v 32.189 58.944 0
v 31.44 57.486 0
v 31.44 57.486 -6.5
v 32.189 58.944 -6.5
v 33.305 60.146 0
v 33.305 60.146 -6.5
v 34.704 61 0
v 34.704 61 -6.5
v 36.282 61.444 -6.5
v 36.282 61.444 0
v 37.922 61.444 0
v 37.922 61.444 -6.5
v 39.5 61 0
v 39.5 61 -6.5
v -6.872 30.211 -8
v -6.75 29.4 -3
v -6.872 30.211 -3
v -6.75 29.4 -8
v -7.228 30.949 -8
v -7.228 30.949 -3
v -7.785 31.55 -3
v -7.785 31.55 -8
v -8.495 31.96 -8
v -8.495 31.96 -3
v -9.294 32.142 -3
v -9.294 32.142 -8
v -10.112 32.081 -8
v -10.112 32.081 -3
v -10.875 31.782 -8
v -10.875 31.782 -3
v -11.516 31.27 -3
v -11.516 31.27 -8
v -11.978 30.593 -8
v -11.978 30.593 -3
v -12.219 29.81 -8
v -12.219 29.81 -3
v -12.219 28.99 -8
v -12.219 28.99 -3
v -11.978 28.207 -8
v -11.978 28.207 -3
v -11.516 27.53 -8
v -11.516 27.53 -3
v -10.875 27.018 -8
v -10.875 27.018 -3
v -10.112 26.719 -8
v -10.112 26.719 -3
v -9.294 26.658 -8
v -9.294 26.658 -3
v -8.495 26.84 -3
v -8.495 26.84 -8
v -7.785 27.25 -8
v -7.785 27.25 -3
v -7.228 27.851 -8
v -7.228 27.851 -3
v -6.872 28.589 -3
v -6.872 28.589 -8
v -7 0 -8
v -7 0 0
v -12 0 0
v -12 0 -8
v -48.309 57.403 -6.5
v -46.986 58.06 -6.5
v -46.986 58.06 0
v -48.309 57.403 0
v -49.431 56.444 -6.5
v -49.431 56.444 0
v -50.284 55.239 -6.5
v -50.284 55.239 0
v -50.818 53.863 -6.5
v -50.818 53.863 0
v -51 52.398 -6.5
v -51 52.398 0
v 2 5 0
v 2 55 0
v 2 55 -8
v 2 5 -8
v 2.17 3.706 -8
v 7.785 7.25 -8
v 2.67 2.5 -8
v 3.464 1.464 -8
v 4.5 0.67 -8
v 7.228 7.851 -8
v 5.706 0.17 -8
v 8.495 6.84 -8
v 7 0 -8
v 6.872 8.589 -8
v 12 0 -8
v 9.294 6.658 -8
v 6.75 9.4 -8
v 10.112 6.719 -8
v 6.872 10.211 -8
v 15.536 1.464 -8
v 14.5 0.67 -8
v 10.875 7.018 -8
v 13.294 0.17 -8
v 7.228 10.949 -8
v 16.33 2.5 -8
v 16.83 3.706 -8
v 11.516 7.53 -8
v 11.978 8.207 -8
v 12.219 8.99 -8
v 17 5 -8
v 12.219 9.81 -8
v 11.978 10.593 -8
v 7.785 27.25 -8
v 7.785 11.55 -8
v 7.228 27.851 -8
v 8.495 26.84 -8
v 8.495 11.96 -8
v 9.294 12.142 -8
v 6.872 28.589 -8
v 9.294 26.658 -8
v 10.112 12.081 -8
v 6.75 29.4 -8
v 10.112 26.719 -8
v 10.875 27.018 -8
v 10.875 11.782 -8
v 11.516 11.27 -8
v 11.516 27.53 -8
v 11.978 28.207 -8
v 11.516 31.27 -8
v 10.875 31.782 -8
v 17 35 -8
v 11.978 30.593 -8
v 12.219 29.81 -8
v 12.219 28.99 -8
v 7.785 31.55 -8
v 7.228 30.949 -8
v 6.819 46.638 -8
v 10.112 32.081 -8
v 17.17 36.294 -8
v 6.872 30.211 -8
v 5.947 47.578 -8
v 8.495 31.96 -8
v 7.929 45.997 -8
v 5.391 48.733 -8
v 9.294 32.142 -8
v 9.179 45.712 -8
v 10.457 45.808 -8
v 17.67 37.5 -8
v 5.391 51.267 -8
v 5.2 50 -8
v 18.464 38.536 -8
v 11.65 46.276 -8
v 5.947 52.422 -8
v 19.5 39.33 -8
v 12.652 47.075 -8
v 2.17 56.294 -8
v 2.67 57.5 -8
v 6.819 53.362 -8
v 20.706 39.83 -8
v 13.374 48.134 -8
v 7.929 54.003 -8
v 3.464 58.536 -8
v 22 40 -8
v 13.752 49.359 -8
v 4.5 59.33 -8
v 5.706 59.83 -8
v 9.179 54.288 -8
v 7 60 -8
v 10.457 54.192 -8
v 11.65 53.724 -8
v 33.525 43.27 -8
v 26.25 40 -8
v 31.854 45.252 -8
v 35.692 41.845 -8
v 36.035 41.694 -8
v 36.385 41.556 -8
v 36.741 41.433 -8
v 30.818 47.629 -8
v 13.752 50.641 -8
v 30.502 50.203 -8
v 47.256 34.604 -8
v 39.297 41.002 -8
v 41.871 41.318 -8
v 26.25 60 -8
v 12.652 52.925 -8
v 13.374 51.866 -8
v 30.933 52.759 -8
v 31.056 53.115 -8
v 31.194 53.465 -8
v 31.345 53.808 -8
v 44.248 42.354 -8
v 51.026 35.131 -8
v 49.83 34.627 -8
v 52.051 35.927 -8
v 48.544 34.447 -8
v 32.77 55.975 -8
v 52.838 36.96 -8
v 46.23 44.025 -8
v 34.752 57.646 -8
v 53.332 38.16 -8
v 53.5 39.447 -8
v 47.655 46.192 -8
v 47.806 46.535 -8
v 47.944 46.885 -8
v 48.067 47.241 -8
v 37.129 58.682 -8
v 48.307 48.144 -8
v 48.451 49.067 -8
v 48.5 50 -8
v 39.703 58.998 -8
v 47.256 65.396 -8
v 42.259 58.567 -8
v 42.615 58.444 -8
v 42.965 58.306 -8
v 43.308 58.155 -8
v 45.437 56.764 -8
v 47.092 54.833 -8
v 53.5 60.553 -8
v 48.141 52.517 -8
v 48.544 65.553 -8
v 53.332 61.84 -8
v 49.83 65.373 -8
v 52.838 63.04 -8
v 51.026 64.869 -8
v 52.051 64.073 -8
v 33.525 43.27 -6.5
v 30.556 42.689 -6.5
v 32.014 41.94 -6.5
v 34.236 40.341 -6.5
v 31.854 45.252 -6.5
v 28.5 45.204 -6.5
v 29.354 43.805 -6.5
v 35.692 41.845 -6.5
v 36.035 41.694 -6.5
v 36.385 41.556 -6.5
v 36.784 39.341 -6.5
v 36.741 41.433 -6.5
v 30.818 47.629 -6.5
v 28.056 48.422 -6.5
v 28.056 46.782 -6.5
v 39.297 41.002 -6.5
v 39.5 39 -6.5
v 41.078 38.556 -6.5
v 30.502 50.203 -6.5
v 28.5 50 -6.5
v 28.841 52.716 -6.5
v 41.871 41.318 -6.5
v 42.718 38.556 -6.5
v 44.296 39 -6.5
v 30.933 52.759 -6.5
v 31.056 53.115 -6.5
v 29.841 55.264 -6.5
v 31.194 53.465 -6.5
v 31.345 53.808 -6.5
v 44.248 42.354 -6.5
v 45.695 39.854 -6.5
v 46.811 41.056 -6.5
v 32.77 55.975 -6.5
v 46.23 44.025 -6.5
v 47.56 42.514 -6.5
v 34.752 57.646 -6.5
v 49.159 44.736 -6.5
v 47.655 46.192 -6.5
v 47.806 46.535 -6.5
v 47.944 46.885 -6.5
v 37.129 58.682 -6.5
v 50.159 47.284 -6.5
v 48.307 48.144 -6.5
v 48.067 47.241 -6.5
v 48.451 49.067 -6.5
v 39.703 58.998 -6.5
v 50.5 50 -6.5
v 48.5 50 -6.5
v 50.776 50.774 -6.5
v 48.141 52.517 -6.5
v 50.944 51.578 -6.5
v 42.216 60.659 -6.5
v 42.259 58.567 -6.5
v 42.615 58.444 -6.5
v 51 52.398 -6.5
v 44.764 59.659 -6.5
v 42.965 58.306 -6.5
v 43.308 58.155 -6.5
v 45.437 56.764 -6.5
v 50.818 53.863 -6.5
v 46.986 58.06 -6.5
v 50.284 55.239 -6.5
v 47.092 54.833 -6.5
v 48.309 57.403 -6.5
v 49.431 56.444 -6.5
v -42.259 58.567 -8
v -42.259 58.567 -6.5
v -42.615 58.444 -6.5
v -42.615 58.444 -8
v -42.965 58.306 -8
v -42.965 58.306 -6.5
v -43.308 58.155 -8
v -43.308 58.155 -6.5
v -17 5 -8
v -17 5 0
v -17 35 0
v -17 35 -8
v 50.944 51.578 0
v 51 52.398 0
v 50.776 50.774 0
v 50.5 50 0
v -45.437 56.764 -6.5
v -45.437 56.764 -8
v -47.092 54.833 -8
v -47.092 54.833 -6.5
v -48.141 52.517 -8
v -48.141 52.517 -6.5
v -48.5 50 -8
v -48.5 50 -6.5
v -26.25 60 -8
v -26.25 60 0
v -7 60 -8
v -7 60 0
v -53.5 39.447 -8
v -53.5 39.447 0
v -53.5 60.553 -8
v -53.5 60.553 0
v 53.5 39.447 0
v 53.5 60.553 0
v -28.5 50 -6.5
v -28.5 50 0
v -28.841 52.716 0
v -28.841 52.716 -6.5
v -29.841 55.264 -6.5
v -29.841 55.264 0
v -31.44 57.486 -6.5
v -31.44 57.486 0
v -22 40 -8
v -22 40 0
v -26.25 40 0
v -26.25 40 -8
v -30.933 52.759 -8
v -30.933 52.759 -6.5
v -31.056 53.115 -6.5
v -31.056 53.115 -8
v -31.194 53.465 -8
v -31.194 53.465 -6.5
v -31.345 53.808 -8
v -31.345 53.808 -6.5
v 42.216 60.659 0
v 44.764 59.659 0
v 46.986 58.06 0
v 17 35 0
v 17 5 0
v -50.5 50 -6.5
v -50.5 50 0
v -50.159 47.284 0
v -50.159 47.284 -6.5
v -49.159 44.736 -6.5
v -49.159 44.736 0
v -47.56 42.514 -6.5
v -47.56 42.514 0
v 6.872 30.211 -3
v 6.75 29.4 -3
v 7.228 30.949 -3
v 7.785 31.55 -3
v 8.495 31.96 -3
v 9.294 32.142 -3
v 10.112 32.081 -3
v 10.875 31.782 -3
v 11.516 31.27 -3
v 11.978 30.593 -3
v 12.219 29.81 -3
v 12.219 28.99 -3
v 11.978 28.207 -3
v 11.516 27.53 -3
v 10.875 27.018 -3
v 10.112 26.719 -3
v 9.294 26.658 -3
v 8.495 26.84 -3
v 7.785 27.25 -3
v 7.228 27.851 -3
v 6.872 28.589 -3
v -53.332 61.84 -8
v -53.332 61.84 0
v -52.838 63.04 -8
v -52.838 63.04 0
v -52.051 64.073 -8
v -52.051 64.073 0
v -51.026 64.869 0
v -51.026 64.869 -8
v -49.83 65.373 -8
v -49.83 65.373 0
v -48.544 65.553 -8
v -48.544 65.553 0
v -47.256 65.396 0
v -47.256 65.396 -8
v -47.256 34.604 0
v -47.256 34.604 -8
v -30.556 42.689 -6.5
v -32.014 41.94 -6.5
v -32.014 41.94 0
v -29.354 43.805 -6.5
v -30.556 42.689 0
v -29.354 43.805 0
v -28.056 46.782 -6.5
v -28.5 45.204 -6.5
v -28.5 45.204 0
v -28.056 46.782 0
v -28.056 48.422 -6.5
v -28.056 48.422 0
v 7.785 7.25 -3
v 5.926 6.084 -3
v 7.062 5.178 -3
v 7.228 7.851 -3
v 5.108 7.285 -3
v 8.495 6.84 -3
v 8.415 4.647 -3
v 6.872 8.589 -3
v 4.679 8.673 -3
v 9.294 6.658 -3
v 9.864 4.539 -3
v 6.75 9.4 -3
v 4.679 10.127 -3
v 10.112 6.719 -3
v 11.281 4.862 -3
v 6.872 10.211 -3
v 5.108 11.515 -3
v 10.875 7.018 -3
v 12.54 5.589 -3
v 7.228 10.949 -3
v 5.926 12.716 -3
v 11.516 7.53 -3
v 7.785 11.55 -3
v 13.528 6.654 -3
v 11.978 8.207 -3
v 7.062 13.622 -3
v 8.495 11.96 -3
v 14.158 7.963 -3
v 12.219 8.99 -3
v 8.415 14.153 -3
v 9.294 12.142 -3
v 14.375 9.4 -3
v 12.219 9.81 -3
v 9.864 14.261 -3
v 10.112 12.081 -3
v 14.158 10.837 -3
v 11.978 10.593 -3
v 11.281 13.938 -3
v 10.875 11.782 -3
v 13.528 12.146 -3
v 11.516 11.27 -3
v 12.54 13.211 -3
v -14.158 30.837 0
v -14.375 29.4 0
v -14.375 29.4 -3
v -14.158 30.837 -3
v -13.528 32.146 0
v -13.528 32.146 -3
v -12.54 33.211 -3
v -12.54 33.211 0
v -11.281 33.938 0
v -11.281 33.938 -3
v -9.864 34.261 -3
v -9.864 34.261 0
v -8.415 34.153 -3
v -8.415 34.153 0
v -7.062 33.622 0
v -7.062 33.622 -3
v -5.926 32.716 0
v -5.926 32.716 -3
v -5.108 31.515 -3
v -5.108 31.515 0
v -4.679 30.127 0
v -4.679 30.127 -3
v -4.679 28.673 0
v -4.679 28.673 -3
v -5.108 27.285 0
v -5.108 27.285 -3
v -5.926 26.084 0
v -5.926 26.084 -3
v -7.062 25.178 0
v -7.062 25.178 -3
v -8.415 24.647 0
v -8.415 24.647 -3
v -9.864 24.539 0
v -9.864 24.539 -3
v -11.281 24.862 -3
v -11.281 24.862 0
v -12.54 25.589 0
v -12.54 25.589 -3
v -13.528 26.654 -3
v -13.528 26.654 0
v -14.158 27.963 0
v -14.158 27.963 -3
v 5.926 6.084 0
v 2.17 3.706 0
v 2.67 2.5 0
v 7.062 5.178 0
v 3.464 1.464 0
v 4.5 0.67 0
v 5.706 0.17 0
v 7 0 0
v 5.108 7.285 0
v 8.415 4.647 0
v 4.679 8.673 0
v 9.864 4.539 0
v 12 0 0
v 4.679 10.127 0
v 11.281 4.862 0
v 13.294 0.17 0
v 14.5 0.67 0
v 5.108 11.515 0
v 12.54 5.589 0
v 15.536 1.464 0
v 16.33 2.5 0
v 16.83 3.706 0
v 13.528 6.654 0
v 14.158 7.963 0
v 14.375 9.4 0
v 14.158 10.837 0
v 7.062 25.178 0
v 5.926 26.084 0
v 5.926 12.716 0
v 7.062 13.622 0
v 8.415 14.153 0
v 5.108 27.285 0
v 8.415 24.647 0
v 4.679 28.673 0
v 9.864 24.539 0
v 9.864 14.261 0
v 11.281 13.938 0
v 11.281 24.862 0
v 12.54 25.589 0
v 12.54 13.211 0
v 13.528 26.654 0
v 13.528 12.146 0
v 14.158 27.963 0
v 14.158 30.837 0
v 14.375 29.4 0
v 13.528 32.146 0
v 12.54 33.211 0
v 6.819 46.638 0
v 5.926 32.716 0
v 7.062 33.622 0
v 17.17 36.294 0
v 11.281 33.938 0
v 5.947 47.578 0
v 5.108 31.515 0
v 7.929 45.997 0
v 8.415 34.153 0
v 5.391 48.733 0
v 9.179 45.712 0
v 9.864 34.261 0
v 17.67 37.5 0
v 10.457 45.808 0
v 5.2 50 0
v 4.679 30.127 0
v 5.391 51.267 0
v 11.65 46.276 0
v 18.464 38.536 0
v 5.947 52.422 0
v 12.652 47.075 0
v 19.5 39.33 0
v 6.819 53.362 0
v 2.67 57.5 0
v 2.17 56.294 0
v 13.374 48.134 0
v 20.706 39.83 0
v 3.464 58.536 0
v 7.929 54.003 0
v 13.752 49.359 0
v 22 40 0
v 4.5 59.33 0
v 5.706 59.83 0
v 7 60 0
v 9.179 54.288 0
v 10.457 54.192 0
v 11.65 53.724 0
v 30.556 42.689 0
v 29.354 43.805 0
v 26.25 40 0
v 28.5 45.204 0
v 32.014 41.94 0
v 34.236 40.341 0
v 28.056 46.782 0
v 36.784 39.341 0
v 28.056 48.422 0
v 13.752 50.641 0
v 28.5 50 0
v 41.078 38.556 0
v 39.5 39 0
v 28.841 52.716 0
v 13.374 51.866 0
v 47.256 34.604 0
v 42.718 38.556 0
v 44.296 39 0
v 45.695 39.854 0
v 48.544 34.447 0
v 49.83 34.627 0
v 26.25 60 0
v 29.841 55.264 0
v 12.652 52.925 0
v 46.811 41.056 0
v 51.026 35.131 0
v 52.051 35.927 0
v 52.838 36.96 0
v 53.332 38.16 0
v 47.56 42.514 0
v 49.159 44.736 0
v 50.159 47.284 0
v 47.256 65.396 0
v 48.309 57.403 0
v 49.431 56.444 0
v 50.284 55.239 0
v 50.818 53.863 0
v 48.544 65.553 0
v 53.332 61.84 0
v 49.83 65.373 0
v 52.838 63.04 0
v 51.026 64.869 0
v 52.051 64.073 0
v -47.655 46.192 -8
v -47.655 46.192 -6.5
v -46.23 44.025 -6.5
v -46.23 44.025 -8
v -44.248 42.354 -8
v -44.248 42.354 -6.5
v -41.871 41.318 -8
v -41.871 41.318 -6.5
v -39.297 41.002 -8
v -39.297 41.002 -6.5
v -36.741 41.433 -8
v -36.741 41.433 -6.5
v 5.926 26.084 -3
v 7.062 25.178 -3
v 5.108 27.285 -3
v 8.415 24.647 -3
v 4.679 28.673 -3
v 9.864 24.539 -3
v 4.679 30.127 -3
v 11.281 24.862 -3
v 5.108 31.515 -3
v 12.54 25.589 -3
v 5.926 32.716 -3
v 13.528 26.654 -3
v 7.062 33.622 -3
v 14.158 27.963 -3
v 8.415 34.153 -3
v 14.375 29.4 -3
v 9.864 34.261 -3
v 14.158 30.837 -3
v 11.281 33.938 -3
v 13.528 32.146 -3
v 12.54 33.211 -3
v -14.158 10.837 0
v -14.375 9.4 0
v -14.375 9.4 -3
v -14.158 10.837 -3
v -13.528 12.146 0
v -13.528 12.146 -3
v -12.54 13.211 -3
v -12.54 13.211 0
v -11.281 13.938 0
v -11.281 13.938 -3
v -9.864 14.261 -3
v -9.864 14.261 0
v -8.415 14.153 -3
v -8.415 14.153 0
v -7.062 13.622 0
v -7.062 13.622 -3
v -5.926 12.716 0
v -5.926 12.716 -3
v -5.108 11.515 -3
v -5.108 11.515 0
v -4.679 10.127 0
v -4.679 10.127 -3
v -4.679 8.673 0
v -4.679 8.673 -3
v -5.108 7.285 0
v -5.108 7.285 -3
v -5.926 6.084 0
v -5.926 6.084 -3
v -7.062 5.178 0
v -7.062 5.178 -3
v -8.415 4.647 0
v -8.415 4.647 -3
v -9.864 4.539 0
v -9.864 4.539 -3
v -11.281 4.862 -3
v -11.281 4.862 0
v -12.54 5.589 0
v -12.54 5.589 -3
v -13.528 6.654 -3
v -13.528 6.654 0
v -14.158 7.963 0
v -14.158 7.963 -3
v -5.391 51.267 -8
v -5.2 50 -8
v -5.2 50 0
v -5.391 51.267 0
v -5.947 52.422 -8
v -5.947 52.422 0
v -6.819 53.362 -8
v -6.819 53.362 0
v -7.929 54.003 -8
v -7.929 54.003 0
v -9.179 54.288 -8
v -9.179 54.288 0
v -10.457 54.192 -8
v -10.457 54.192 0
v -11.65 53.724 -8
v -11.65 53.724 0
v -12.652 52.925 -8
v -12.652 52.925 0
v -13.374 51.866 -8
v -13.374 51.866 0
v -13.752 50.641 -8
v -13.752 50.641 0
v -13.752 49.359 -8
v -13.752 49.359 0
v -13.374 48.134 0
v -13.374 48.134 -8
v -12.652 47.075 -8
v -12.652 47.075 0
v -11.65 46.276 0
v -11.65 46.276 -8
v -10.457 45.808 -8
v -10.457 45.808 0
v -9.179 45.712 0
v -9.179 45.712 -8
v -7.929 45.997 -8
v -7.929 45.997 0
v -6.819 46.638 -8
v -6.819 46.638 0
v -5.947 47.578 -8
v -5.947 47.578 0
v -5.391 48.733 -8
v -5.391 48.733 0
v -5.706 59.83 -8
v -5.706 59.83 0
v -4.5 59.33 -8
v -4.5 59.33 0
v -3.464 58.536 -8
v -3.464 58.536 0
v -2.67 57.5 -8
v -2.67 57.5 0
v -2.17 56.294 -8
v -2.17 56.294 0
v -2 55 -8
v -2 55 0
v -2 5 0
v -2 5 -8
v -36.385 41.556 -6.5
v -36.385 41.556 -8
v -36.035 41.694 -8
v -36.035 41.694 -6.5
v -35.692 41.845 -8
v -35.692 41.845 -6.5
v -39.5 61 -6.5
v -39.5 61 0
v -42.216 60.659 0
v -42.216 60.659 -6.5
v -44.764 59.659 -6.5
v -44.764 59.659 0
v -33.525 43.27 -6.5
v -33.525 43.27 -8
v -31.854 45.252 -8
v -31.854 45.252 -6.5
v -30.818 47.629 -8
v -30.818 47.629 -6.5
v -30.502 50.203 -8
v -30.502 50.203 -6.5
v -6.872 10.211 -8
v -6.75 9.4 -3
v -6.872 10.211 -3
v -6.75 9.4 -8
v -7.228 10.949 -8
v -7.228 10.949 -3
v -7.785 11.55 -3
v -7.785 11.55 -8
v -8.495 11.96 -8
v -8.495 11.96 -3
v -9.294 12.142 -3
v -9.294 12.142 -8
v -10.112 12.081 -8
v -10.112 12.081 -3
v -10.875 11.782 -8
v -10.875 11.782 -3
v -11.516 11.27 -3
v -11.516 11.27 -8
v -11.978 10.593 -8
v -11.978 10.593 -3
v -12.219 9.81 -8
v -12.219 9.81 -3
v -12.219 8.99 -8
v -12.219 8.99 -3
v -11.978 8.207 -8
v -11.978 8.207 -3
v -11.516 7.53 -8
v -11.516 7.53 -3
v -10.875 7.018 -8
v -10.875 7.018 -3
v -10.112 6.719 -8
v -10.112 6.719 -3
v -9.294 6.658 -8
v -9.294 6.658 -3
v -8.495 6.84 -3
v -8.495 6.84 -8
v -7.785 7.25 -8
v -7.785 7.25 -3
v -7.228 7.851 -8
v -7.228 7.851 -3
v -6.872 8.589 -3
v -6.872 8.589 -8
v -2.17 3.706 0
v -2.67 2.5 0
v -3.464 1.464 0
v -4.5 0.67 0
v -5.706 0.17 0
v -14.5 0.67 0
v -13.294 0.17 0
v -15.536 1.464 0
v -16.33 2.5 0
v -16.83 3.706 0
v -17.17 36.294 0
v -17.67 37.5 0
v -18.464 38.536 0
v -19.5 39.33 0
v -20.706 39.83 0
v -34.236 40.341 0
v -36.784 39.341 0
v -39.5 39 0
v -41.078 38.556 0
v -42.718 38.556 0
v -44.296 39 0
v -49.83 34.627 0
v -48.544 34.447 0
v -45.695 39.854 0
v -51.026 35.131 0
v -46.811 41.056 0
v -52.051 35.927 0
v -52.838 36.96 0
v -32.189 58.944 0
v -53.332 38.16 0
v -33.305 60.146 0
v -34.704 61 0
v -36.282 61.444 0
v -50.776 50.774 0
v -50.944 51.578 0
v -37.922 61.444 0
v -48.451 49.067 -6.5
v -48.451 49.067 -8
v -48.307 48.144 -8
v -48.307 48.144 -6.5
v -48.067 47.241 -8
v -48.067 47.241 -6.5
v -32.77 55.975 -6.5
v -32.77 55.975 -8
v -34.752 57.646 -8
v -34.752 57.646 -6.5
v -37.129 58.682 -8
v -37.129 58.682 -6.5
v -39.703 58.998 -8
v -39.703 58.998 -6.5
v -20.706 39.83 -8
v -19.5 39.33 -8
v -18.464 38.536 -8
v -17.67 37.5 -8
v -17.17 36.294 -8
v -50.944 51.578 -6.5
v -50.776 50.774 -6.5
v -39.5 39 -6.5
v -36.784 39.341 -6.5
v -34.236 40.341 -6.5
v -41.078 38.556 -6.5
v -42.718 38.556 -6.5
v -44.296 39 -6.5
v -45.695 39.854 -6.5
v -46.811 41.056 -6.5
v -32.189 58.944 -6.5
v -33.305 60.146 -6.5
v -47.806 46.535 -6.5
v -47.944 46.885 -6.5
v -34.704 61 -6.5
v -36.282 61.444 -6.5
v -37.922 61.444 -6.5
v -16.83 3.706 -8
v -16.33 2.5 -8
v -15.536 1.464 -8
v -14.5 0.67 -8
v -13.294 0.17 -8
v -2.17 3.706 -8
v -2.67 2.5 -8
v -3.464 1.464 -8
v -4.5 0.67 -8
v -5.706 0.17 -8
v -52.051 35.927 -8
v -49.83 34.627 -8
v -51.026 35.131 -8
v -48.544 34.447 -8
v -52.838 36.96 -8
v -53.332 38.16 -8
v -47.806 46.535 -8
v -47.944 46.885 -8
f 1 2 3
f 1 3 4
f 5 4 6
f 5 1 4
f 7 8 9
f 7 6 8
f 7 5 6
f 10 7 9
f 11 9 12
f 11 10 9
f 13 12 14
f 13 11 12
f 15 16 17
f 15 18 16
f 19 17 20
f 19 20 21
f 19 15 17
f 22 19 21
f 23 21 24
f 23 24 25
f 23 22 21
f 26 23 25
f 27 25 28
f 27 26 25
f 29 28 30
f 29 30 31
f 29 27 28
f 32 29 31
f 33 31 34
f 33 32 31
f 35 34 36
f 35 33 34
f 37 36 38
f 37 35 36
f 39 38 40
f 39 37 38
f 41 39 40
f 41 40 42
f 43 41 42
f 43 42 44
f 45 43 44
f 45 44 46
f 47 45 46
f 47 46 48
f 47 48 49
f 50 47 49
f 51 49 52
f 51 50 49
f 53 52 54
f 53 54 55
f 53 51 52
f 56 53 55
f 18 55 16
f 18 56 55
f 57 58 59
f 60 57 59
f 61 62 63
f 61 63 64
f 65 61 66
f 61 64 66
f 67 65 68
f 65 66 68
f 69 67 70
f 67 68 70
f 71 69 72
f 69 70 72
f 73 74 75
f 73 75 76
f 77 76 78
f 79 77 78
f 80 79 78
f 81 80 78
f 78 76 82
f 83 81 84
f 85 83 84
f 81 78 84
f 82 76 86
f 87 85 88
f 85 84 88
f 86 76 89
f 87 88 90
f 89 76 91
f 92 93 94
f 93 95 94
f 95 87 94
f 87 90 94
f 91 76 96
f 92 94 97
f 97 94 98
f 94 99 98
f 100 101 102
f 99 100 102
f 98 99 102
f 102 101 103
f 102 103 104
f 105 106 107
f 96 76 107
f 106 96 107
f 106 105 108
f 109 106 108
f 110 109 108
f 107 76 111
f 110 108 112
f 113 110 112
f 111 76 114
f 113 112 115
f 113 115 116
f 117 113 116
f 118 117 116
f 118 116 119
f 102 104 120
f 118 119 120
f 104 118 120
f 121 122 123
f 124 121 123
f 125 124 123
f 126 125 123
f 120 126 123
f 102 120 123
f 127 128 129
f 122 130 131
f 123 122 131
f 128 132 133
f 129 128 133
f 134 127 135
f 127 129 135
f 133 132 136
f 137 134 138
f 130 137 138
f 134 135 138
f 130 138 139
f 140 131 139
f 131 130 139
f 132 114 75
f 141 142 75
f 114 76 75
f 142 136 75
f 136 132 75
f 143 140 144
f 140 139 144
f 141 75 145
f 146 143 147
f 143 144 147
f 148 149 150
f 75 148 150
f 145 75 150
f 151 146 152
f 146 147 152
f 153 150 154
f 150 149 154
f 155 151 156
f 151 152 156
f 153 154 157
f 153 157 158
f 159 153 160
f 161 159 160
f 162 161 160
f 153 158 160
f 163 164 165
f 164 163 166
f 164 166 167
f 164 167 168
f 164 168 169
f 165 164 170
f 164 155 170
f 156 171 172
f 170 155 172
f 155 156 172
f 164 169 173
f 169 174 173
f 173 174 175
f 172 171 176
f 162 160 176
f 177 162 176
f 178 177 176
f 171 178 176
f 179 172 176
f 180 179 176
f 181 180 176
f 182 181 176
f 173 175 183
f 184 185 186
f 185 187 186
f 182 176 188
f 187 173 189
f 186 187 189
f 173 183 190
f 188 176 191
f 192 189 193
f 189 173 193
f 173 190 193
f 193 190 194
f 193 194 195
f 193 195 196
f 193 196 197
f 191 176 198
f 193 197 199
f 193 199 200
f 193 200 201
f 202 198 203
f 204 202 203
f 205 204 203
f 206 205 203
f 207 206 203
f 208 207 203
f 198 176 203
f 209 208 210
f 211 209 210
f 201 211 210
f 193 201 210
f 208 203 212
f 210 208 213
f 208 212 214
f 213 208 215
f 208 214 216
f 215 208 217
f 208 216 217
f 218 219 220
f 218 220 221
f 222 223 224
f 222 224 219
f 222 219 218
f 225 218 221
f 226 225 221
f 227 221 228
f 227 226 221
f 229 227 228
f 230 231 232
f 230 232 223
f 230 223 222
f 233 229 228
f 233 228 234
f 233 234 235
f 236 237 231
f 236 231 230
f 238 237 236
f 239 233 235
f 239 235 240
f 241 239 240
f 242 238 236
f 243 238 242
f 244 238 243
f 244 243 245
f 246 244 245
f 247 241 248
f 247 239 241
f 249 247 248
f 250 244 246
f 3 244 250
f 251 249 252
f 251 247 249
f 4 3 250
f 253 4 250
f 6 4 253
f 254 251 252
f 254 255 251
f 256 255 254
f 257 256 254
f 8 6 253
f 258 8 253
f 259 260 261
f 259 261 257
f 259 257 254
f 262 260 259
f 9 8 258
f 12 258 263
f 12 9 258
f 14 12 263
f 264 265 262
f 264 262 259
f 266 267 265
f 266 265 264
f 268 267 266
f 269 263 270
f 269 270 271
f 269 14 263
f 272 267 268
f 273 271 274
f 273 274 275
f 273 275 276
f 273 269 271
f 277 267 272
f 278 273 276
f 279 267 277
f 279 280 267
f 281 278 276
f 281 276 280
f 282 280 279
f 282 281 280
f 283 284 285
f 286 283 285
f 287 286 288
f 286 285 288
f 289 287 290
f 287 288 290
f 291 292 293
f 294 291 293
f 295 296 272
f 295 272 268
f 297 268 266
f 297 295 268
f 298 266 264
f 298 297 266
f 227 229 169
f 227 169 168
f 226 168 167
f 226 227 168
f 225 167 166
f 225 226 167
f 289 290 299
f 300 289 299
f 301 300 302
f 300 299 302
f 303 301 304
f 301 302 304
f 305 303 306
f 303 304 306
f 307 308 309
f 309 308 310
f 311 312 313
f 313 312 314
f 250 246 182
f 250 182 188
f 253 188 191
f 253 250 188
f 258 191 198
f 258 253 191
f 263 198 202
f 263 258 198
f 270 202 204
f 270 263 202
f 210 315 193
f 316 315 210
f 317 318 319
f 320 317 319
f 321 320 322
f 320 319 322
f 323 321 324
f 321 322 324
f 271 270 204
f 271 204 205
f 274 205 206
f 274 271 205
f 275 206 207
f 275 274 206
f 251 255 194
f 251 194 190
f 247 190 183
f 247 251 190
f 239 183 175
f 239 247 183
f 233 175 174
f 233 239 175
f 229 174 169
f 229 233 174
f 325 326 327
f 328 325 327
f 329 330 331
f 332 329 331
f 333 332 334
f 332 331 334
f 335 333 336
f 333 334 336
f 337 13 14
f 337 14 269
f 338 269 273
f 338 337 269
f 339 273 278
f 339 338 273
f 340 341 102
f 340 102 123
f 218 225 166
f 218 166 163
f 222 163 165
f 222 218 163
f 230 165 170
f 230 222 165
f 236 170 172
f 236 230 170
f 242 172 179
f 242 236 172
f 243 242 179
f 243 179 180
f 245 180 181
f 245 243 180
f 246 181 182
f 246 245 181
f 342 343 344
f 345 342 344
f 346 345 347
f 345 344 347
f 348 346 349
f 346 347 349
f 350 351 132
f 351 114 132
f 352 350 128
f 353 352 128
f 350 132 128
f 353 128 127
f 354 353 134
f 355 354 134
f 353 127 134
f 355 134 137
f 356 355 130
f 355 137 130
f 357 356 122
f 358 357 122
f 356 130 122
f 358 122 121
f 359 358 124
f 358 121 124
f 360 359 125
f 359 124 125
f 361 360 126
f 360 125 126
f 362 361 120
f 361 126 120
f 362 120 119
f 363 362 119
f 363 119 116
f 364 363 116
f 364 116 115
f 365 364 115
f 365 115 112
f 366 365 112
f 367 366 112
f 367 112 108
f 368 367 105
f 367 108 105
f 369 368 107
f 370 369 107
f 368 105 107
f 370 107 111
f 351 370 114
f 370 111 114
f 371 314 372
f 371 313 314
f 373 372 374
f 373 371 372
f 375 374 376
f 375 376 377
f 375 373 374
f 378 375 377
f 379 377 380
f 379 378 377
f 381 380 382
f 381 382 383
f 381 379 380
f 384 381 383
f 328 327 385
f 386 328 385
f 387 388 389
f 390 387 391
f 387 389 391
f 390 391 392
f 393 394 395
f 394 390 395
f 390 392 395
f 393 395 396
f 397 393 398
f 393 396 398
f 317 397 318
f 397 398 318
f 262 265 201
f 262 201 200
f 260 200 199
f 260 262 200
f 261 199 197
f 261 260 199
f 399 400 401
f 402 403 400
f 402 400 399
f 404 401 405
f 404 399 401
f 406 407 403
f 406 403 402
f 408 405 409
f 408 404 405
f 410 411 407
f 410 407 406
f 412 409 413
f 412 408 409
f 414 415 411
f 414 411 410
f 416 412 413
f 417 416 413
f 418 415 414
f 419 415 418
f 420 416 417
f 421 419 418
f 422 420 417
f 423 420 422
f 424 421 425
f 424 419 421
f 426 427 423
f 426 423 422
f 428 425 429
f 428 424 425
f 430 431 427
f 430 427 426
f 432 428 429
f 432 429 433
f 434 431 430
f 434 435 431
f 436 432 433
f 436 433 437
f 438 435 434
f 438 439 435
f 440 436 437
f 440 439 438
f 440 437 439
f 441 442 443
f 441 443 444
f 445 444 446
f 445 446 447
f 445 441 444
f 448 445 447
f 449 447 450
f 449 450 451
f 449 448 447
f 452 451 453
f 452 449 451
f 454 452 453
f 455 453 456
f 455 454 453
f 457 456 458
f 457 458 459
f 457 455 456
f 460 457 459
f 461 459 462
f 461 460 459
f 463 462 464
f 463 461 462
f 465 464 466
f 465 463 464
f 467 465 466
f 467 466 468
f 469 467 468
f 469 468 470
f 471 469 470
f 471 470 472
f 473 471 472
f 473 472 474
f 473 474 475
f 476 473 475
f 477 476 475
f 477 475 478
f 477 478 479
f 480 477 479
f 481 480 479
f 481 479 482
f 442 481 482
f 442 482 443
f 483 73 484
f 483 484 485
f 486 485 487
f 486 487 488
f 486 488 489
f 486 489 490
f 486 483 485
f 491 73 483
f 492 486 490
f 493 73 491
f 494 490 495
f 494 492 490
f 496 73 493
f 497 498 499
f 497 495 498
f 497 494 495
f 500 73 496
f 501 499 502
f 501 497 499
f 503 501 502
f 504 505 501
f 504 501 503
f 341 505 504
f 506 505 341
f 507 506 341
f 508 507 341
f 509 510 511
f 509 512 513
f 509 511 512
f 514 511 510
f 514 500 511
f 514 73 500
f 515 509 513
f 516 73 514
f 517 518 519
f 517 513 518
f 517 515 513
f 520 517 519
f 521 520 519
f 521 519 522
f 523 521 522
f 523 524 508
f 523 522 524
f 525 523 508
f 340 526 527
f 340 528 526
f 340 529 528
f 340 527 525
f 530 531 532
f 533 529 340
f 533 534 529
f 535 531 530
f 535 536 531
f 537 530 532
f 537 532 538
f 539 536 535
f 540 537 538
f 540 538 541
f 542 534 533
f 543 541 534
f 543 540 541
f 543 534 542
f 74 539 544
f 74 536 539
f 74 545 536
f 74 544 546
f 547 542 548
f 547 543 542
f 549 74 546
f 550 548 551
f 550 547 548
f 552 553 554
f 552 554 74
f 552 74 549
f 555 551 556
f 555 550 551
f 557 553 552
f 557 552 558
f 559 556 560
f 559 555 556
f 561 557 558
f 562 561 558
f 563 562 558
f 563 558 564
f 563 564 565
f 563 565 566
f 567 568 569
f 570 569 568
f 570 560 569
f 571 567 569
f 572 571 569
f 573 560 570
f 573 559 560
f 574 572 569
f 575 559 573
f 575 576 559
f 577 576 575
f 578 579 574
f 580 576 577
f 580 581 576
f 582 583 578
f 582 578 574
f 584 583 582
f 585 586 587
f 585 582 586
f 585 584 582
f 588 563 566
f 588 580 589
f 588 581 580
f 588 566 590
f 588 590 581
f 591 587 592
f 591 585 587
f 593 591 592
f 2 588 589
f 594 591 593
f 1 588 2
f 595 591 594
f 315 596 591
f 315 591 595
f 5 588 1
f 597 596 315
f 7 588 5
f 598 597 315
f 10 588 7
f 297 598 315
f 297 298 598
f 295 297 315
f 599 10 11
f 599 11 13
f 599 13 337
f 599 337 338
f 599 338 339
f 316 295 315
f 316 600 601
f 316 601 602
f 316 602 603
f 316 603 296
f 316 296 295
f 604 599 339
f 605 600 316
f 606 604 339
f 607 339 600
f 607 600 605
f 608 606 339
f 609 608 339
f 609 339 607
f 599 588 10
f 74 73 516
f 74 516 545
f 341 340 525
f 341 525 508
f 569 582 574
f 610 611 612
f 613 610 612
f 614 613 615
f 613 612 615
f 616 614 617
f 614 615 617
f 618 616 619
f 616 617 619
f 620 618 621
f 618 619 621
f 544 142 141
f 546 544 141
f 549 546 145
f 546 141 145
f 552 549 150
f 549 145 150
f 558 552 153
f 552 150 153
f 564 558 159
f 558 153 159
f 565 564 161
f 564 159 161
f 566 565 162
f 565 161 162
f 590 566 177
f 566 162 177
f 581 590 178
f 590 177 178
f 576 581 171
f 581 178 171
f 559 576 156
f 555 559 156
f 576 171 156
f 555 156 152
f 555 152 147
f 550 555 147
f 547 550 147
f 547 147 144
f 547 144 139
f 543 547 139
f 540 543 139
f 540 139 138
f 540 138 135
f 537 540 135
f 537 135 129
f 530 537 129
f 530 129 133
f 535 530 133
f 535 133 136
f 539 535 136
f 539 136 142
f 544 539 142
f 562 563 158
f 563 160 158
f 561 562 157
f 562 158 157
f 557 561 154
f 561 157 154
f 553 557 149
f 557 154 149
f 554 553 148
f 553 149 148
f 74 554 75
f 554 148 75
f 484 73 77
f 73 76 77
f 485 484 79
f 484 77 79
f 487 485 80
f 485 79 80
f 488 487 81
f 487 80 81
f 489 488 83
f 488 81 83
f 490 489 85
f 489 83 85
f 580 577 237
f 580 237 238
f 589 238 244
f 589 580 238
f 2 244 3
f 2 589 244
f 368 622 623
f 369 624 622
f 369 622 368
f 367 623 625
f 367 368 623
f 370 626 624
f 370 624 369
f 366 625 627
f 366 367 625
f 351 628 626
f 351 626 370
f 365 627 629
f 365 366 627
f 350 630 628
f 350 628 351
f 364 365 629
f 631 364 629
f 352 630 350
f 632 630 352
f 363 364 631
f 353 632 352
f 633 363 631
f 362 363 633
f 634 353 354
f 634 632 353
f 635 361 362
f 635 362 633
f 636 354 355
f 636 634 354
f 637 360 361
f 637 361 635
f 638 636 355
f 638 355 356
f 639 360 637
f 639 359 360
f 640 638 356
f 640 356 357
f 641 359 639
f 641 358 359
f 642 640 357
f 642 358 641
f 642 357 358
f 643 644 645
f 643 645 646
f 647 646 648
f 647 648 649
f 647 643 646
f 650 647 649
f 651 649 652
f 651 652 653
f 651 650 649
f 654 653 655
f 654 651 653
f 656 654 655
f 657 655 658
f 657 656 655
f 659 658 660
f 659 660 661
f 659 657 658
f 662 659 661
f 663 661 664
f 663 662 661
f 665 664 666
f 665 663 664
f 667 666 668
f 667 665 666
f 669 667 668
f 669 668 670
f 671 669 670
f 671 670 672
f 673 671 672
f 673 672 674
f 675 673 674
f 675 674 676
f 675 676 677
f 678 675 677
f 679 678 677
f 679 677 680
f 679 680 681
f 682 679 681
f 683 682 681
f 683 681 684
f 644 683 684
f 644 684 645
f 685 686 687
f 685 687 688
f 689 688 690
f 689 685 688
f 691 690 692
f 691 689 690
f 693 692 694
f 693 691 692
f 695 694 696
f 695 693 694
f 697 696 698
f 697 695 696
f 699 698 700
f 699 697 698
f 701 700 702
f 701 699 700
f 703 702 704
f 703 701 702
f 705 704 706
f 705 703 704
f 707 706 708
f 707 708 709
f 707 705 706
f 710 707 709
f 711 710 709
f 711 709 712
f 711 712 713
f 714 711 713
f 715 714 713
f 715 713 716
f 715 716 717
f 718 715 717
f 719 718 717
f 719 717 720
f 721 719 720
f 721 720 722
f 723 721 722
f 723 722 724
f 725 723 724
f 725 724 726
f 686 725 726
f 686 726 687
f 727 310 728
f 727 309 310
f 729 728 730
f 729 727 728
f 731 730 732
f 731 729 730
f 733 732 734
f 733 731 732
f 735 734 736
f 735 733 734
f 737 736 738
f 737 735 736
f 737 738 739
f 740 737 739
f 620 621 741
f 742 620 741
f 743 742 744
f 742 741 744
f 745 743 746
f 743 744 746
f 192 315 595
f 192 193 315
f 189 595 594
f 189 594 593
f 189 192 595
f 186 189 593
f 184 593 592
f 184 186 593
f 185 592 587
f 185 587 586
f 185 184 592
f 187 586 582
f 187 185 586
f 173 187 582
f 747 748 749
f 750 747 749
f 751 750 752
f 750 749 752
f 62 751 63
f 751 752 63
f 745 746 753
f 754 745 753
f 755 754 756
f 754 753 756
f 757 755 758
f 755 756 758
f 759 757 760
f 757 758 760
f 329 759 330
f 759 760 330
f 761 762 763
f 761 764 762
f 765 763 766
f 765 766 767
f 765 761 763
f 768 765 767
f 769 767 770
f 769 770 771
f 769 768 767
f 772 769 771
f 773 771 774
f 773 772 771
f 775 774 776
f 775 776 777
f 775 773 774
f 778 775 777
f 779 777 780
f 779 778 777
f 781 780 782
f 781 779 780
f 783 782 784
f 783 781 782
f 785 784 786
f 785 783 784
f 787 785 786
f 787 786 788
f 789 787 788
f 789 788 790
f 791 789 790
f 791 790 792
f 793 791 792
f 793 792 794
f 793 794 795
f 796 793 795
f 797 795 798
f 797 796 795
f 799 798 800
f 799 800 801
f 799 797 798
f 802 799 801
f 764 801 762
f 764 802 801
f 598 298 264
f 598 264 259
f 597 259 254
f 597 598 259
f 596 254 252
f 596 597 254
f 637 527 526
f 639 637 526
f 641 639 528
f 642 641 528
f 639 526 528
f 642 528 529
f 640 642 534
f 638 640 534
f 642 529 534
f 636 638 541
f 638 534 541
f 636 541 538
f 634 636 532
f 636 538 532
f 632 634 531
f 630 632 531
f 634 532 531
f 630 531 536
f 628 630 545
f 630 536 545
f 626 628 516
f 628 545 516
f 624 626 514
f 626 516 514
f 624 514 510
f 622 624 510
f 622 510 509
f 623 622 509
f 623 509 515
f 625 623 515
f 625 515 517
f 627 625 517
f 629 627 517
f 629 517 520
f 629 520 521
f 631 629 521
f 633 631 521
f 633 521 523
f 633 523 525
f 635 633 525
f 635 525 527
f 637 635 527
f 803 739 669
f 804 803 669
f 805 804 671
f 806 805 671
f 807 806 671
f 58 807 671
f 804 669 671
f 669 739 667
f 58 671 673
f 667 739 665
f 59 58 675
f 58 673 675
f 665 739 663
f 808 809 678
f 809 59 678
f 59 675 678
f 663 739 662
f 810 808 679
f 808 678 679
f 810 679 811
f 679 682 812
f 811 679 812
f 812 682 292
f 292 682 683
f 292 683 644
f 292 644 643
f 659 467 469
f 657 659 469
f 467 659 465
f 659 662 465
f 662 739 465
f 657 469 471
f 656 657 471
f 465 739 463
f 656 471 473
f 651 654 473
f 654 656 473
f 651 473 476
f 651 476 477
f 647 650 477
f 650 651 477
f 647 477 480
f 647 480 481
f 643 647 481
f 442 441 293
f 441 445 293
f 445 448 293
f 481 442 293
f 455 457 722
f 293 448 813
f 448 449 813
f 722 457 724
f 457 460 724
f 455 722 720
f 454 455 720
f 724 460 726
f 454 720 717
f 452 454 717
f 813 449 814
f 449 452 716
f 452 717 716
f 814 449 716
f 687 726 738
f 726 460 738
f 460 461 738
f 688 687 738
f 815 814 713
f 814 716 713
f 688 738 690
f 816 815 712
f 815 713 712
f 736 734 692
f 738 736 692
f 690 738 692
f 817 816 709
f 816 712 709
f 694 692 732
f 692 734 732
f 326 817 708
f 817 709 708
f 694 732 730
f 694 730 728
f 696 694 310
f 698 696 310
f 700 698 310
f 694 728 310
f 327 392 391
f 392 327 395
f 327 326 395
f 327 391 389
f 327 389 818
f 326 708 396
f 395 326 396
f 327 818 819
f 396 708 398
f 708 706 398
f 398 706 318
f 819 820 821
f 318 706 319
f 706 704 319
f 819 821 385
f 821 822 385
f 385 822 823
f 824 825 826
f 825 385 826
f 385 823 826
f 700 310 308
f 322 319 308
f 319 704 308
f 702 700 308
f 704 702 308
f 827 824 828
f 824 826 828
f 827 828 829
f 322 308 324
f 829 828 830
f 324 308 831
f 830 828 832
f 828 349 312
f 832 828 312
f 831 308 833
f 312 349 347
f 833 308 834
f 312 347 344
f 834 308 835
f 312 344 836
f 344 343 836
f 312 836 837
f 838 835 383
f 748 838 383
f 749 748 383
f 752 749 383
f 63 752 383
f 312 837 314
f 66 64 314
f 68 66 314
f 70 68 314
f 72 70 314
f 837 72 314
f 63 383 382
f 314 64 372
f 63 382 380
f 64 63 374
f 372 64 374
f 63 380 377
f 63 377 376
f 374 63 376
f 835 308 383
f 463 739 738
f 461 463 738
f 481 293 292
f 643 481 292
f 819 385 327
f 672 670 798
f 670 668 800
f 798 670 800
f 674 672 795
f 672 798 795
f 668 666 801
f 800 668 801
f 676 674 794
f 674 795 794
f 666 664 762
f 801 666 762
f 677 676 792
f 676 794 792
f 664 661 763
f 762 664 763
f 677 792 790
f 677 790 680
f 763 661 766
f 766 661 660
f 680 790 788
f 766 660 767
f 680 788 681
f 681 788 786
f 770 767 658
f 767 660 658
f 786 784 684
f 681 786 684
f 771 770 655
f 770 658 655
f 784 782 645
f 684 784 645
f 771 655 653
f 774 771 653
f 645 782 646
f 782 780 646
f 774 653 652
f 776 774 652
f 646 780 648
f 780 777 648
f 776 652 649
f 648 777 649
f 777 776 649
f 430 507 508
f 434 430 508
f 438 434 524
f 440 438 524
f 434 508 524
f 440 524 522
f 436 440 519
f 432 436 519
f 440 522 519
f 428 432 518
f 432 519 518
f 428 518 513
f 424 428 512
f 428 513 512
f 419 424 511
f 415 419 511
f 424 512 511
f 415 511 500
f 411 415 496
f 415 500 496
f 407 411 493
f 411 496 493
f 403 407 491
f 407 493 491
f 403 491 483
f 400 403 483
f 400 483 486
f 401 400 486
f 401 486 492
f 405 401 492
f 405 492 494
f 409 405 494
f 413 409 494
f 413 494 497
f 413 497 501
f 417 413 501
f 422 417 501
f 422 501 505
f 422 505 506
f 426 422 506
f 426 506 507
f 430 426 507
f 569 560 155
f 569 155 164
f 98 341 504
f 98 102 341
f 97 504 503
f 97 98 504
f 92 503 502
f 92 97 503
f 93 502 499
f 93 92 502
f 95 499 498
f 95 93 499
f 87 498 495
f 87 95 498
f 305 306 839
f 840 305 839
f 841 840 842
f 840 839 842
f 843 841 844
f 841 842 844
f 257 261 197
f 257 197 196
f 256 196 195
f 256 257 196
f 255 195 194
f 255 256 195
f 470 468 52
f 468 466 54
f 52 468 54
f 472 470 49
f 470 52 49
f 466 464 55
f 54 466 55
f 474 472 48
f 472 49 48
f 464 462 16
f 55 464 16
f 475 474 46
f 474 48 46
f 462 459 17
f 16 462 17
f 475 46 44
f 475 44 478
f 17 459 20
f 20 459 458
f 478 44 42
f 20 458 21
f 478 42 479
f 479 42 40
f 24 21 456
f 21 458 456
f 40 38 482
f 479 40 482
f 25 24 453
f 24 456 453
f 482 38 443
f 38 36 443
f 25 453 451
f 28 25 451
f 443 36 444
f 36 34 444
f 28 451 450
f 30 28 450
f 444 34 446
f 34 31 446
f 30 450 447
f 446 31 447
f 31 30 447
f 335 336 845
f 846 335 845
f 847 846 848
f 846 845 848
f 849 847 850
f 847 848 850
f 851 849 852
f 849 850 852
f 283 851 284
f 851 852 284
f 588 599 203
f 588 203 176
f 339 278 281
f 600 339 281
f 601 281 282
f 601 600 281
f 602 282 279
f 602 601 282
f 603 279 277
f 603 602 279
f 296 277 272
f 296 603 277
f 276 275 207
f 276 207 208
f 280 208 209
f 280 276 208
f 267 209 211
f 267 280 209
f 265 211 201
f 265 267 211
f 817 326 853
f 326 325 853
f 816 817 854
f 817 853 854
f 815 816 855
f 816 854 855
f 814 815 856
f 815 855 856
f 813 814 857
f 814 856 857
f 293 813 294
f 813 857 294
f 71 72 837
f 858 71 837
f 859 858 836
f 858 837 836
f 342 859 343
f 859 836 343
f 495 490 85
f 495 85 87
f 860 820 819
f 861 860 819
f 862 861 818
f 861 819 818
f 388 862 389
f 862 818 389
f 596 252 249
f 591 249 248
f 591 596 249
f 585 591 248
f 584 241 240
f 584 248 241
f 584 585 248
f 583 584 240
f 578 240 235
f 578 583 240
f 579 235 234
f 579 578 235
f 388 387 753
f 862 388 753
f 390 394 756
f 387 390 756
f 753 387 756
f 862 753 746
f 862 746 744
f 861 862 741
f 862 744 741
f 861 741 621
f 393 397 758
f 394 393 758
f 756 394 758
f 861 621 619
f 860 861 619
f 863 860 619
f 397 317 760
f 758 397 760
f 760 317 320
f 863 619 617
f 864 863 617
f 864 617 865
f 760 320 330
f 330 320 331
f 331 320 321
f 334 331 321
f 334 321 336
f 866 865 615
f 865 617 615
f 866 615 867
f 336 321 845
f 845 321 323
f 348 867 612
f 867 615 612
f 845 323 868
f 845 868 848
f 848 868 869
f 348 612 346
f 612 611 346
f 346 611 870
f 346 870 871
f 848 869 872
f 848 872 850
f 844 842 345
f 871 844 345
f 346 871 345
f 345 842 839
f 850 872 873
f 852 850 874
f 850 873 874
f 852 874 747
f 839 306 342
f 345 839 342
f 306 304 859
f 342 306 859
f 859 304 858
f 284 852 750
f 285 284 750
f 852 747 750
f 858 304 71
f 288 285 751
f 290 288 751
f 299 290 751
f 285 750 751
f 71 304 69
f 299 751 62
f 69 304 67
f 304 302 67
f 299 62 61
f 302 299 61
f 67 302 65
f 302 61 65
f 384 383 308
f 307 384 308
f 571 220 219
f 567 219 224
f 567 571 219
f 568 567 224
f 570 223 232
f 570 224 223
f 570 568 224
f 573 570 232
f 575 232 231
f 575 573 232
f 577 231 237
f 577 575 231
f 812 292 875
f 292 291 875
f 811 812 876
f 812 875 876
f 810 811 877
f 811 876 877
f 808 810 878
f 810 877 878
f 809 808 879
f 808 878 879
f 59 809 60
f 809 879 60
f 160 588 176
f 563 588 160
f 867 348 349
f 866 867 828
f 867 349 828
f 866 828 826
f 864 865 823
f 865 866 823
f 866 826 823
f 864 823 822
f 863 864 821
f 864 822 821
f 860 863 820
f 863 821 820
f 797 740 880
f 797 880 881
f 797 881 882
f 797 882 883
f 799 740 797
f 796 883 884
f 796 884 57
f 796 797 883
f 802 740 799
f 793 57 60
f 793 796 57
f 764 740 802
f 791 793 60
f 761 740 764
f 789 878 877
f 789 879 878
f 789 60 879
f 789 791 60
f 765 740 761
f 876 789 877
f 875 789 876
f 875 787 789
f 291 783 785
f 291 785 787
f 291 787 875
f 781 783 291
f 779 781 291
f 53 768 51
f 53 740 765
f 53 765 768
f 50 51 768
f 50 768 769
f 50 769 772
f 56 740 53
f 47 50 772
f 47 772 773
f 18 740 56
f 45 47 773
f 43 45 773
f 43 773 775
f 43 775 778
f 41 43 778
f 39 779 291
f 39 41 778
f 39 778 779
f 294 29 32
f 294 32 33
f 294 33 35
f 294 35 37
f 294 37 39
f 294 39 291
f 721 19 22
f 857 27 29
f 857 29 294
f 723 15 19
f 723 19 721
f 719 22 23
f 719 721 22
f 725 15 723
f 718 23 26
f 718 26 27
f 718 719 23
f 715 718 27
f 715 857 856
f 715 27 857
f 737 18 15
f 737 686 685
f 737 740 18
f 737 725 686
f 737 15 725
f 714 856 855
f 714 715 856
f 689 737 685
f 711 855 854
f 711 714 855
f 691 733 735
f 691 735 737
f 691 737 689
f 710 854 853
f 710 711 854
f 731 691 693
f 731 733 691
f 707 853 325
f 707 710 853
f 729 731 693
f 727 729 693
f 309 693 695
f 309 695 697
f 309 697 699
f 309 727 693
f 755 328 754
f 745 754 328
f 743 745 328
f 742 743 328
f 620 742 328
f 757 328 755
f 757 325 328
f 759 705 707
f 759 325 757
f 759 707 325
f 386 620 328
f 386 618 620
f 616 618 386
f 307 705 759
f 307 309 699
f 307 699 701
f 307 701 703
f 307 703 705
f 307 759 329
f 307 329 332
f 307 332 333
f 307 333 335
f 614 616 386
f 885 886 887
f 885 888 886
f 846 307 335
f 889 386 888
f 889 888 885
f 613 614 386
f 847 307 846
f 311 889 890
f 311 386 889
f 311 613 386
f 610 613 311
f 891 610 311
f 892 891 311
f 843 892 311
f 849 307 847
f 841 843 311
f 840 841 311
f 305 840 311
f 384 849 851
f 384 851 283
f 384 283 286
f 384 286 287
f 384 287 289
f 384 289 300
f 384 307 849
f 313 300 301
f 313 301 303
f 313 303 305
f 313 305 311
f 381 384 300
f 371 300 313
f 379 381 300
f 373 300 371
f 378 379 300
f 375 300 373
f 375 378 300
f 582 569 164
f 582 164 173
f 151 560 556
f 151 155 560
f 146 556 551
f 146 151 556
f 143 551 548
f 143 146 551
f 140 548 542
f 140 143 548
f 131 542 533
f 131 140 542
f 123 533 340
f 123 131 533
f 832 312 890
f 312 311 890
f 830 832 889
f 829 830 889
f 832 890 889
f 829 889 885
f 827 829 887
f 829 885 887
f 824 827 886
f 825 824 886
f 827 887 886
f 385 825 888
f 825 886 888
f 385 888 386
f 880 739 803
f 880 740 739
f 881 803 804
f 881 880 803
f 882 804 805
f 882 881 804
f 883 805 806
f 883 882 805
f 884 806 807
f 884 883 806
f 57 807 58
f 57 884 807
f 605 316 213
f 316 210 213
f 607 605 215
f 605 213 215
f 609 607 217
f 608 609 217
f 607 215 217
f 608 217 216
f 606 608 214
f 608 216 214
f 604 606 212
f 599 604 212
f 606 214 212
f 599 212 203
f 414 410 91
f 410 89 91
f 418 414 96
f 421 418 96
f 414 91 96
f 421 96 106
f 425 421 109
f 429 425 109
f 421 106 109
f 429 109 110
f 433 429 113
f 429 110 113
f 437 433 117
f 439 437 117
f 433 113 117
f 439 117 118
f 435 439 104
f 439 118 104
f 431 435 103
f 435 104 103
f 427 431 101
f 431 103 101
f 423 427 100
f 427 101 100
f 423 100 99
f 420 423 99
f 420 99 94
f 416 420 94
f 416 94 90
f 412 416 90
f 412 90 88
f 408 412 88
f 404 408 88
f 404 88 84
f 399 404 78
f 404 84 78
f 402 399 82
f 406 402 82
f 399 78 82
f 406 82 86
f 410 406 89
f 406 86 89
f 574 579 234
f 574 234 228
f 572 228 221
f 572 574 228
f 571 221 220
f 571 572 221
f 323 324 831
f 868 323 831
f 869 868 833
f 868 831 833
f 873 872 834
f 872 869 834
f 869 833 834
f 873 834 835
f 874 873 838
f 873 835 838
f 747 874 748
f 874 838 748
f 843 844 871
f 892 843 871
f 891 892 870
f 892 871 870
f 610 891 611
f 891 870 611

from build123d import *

# Parameters (mm, degrees)
F1_DEPTH       = 8
F2_D           = 8.6
F3_D           = 5.5
F3_CBORE_D     = 9.75
F3_CBORE_DEPTH = 3
F4_R           = 5
F5_START       = -6.5
F5_DEPTH       = 1.5


# Not quite as in the source:
# - a feature names something its author has since deleted; it is built from what else it names


with BuildPart() as f1:
    # F0 (on Top) → F1 (new body)
    with BuildSketch(Plane.XY):
        Polygon((53.5, 33), (53.5, 67), (26.25, 60), (2, 60), (2, 40), (2, 0), (17, 0), (17, 40), (26.25, 40), align=None)
        with BuildLine():
            ThreePointArc((51, 52.3979157617), (50.8736700622, 51.1731708903), (50.5, 50))
            ThreePointArc((50.5, 50), (49.7385612859, 45.978574532), (47.55966131, 42.5138888889))
            ThreePointArc((47.55966131, 42.5138888889), (44.2958315233, 39), (39.5, 39))
            ThreePointArc((39.5, 39), (35.478574532, 39.7614387141), (32.0138888889, 41.94033869))
            ThreePointArc((32.0138888889, 41.94033869), (28.5, 45.2041684767), (28.5, 50))
            ThreePointArc((28.5, 50), (29.2614387141, 54.021425468), (31.44033869, 57.4861111111))
            ThreePointArc((31.44033869, 57.4861111111), (34.7041684767, 61), (39.5, 61))
            ThreePointArc((39.5, 61), (43.521425468, 60.2385612859), (46.9861111111, 58.05966131))
            ThreePointArc((46.9861111111, 58.05966131), (49.8947250519, 55.8680262306), (51, 52.3979157617))
        make_face(mode=Mode.SUBTRACT)
    extrude(amount=-F1_DEPTH)

    # F2 (through all)
    with Locations(Plane.XY):
        with Locations((9.5, 50)):
            Hole(F2_D / 2)

    # F3 (through all)
    with Locations(Plane.XY):
        with Locations((9.5, 29.4), (9.5, 9.4)):
            CounterBoreHole(F3_D / 2, F3_CBORE_D / 2, F3_CBORE_DEPTH)

    # F4
    f4_edges = [f1.edges().sort_by_distance(p)[0] for p in [
        (17, 0, -4),
        (2, 60, -4),
        (53.5, 33, -4),
        (53.5, 67, -4),
        (17, 40, -4),
        (2, 0, -4),
    ]]
    fillet(f4_edges, radius=F4_R)

    # F0 (on Top) → F5 (join)
    with BuildSketch(Plane.XY.offset(F5_START)):
        with BuildLine():
            ThreePointArc((42.2592068472, 58.5666082888), (41.0707112049, 60), (39.5, 61))
            ThreePointArc((39.5, 61), (35.1038211036, 60.0833333333), (31.44033869, 57.4861111111))
            ThreePointArc((31.44033869, 57.4861111111), (31.104078936, 55.6547009803), (31.3454826891, 53.8083917112))
            ThreePointArc((31.3454826891, 53.8083917112), (35.9031263575, 58.25), (42.2592068472, 58.5666082888))
        make_face()
        with BuildLine():
            ThreePointArc((31.44033869, 57.4861111111), (35.1038211036, 60.0833333333), (39.5, 61))
            ThreePointArc((39.5, 61), (34.7041684767, 61), (31.44033869, 57.4861111111))
        make_face()
        with BuildLine():
            ThreePointArc((43.3083917112, 58.1545173109), (45.1547009803, 58.395921064), (46.9861111111, 58.05966131))
            ThreePointArc((46.9861111111, 58.05966131), (43.521425468, 60.2385612859), (39.5, 61))
            ThreePointArc((39.5, 61), (41.0707112049, 60), (42.2592068472, 58.5666082888))
            ThreePointArc((42.2592068472, 58.5666082888), (42.7902572011, 58.3770046885), (43.3083917112, 58.1545173109))
        make_face()
        with BuildLine():
            ThreePointArc((48.0666082888, 47.2407931528), (49.5, 48.4292887951), (50.5, 50))
            ThreePointArc((50.5, 50), (49.5833333333, 54.3961788964), (46.9861111111, 58.05966131))
            ThreePointArc((46.9861111111, 58.05966131), (45.1547009803, 58.395921064), (43.3083917112, 58.1545173109))
            ThreePointArc((43.3083917112, 58.1545173109), (47.0919538131, 54.8334498342), (48.5, 50))
            ThreePointArc((48.5, 50), (48.3909919188, 48.603481937), (48.0666082888, 47.2407931528))
        make_face()
        with BuildLine():
            ThreePointArc((46.9861111111, 58.05966131), (49.5833333333, 54.3961788964), (50.5, 50))
            ThreePointArc((50.5, 50), (50.8736700622, 51.1731708903), (51, 52.3979157617))
            ThreePointArc((51, 52.3979157617), (49.8947250519, 55.8680262306), (46.9861111111, 58.05966131))
        make_face()
        with BuildLine():
            ThreePointArc((47.55966131, 42.5138888889), (49.7385612859, 45.978574532), (50.5, 50))
            ThreePointArc((50.5, 50), (49.5, 48.4292887951), (48.0666082888, 47.2407931528))
            ThreePointArc((48.0666082888, 47.2407931528), (47.8770046885, 46.7097427989), (47.6545173109, 46.1916082888))
            ThreePointArc((47.6545173109, 46.1916082888), (47.8367544232, 45.3545146881), (47.8979157617, 44.5))
            ThreePointArc((47.8979157617, 44.5), (47.8127476819, 43.4926453678), (47.55966131, 42.5138888889))
        make_face()
        with BuildLine():
            ThreePointArc((39.5, 39), (43.8961788964, 39.9166666667), (47.55966131, 42.5138888889))
            ThreePointArc((47.55966131, 42.5138888889), (47.8127476819, 43.4926453678), (47.8979157617, 44.5))
            ThreePointArc((47.8979157617, 44.5), (47.8367544232, 45.3545146881), (47.6545173109, 46.1916082888))
            ThreePointArc((47.6545173109, 46.1916082888), (43.0968736425, 41.75), (36.7407931528, 41.4333917112))
            ThreePointArc((36.7407931528, 41.4333917112), (37.9292887951, 40), (39.5, 39))
        make_face()
        with BuildLine():
            ThreePointArc((39.5, 39), (44.2958315233, 39), (47.55966131, 42.5138888889))
            ThreePointArc((47.55966131, 42.5138888889), (43.8961788964, 39.9166666667), (39.5, 39))
        make_face()
        with BuildLine():
            ThreePointArc((32.0138888889, 41.94033869), (35.478574532, 39.7614387141), (39.5, 39))
            ThreePointArc((39.5, 39), (37.9292887951, 40), (36.7407931528, 41.4333917112))
            ThreePointArc((36.7407931528, 41.4333917112), (36.2097427989, 41.6229953115), (35.6916082888, 41.8454826891))
            ThreePointArc((35.6916082888, 41.8454826891), (33.8452990197, 41.604078936), (32.0138888889, 41.94033869))
        make_face()
        with BuildLine():
            ThreePointArc((28.5, 50), (29.4166666667, 45.6038211036), (32.0138888889, 41.94033869))
            ThreePointArc((32.0138888889, 41.94033869), (33.8452990197, 41.604078936), (35.6916082888, 41.8454826891))
            ThreePointArc((35.6916082888, 41.8454826891), (31.25, 46.4031263575), (30.9333917112, 52.7592068472))
            ThreePointArc((30.9333917112, 52.7592068472), (29.5, 51.5707112049), (28.5, 50))
        make_face()
        with BuildLine():
            ThreePointArc((28.5, 50), (28.5, 45.2041684767), (32.0138888889, 41.94033869))
            ThreePointArc((32.0138888889, 41.94033869), (29.4166666667, 45.6038211036), (28.5, 50))
        make_face()
        with BuildLine():
            ThreePointArc((31.3454826891, 53.8083917112), (31.104078936, 55.6547009803), (31.44033869, 57.4861111111))
            ThreePointArc((31.44033869, 57.4861111111), (29.2614387141, 54.021425468), (28.5, 50))
            ThreePointArc((28.5, 50), (29.5, 51.5707112049), (30.9333917112, 52.7592068472))
            ThreePointArc((30.9333917112, 52.7592068472), (31.1229953115, 53.2902572011), (31.3454826891, 53.8083917112))
        make_face()
    extrude(amount=-F5_DEPTH)


with BuildPart() as f6_1:
    # F6: instance of F1
    add(f1.part.mirror(Plane.YZ))


solid = Compound([f1.part, f6_1.part])
